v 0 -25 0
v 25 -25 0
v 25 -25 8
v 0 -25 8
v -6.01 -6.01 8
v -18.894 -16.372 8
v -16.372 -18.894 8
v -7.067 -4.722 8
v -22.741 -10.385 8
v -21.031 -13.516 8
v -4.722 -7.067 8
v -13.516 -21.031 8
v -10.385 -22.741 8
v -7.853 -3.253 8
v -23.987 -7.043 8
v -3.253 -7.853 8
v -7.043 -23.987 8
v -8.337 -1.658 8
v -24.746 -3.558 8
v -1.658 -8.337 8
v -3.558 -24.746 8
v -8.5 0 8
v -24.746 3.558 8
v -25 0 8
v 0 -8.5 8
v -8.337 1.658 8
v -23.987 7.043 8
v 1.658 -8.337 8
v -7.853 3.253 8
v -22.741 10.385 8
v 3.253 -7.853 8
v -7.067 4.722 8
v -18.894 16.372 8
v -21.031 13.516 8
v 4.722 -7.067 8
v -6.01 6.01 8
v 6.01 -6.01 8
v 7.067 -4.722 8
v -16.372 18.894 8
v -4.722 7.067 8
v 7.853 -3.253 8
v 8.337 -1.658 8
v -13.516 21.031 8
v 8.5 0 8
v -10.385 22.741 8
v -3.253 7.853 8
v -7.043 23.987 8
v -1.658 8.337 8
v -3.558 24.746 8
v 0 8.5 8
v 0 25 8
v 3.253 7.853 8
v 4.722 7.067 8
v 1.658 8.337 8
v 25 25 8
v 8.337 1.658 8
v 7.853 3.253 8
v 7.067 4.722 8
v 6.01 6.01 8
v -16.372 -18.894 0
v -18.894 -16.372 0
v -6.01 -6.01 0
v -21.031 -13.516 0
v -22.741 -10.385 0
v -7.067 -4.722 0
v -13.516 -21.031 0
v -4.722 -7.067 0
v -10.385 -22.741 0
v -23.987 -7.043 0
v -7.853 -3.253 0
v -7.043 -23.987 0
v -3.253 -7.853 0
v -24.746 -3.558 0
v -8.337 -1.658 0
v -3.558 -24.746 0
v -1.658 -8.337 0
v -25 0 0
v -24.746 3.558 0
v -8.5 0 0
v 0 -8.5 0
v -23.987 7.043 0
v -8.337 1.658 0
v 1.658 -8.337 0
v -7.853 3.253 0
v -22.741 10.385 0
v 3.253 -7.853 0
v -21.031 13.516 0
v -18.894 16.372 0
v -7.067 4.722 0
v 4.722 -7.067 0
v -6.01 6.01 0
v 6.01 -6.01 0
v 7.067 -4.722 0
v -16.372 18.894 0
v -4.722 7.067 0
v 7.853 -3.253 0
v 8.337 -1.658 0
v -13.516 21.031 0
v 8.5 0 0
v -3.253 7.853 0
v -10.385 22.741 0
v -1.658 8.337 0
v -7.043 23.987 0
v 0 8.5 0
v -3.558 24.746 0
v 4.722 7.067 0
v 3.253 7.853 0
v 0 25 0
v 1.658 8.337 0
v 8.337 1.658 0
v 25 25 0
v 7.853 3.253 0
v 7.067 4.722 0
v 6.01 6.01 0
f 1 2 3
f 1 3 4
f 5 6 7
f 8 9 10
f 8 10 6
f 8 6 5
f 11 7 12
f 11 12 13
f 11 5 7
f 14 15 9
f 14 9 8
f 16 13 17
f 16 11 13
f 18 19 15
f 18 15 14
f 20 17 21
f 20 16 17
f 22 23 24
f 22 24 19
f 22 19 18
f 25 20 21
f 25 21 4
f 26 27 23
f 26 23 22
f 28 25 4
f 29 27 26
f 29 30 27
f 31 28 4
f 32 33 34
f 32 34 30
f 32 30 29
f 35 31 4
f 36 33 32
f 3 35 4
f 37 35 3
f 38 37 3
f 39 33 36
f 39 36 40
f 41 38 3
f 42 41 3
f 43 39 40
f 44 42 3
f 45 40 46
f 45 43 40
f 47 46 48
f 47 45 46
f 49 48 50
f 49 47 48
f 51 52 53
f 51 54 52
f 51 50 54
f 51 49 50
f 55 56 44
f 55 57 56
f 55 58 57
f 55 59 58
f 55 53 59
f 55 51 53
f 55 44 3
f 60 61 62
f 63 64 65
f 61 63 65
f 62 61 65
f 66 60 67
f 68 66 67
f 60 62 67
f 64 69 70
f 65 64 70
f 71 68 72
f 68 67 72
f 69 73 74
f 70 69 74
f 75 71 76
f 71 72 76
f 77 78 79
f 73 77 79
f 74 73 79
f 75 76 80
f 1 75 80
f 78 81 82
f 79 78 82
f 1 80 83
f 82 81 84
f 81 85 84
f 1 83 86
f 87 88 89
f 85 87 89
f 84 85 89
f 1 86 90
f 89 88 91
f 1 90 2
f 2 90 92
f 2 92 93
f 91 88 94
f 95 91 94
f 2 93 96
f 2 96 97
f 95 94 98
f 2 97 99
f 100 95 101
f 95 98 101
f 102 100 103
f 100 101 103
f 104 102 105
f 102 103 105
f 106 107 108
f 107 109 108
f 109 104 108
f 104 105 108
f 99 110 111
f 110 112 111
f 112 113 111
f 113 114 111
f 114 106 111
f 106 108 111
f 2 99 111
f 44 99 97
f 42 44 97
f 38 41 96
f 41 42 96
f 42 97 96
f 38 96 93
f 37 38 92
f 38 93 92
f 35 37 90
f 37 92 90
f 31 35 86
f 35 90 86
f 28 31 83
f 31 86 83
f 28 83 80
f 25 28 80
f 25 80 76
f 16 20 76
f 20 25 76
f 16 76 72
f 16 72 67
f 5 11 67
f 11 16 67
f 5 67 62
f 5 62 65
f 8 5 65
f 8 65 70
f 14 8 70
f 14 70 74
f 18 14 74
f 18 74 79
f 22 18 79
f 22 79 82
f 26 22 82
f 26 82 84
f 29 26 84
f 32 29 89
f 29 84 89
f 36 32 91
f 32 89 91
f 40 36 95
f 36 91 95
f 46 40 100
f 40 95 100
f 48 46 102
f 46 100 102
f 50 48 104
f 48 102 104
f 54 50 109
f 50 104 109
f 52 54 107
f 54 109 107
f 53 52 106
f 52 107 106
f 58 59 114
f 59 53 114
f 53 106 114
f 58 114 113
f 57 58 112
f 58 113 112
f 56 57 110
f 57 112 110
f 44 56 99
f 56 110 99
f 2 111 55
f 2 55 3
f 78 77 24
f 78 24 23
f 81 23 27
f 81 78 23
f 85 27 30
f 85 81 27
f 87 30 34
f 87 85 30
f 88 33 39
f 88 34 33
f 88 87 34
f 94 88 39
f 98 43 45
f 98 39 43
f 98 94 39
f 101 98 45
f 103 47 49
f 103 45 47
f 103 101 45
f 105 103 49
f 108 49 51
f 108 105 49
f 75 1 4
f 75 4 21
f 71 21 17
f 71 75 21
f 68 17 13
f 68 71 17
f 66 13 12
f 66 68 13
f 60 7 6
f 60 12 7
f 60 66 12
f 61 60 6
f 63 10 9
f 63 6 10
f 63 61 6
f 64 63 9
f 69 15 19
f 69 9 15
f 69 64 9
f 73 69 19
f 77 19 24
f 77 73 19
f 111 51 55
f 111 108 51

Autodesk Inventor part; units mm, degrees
ref_plane "YZ Plane" through (0, 0, 0) normal (1, 0, 0) x (0, 1, 0)
ref_plane "XZ Plane" through (0, 0, 0) normal (0, 1, 0) x (-1, 0, 0)
ref_plane "XY Plane" through (0, 0, 0) normal (0, 0, 1) x (1, 0, 0)
sketch "Sketch1" plane through (0, 0, 0) normal (0, 0, 1) x (1, 0, 0)
  line L0 (-25, 25) -> (25, 25)
  line L1 (25, 25) -> (25, -25)
  line L2 (25, -25) -> (-25, -25)
  line L3 (-25, -25) -> (-25, 25)
  line L4 (-25, 25) -> (25, -25) construction
  line L5 (25, 25) -> (-25, -25) construction
  circle A0 centre (0, 0) radius 8.5
  line L6 (0, 25) -> (0, -25) construction
  arc A1 (0, 25) -> (0, -25) centre (0, 0) ccw
  point P0 (0, 0)
  point P1 (-25, 0)
  dimension "d0" = 50
  dimension "d1" = 50
  dimension "d14" = 17
extrude "Plate1" add sketch "Sketch1" along normal blind 8 contours L0 L1 L2 A1
equation "\"d2\" = Thickness"
equation "\"BendRadius\" = Thickness"
equation "\"BendReliefWidth\" = Thickness"
equation "\"BendReliefDepth\" = 0.5 * Thickness"
equation "\"CornerReliefSize\" = 4 * Thickness"
equation "\"MinimumRemnant\" = 2 * Thickness"
equation "\"TransitionRadius\" = BendRadius"
equation "\"JacobiRadiusSize\" = BendRadius"
equation "\"GapSize\" = Thickness"
equation "\"Thickness\" = 8"
properties part number "PNS-0872 roof ring"
